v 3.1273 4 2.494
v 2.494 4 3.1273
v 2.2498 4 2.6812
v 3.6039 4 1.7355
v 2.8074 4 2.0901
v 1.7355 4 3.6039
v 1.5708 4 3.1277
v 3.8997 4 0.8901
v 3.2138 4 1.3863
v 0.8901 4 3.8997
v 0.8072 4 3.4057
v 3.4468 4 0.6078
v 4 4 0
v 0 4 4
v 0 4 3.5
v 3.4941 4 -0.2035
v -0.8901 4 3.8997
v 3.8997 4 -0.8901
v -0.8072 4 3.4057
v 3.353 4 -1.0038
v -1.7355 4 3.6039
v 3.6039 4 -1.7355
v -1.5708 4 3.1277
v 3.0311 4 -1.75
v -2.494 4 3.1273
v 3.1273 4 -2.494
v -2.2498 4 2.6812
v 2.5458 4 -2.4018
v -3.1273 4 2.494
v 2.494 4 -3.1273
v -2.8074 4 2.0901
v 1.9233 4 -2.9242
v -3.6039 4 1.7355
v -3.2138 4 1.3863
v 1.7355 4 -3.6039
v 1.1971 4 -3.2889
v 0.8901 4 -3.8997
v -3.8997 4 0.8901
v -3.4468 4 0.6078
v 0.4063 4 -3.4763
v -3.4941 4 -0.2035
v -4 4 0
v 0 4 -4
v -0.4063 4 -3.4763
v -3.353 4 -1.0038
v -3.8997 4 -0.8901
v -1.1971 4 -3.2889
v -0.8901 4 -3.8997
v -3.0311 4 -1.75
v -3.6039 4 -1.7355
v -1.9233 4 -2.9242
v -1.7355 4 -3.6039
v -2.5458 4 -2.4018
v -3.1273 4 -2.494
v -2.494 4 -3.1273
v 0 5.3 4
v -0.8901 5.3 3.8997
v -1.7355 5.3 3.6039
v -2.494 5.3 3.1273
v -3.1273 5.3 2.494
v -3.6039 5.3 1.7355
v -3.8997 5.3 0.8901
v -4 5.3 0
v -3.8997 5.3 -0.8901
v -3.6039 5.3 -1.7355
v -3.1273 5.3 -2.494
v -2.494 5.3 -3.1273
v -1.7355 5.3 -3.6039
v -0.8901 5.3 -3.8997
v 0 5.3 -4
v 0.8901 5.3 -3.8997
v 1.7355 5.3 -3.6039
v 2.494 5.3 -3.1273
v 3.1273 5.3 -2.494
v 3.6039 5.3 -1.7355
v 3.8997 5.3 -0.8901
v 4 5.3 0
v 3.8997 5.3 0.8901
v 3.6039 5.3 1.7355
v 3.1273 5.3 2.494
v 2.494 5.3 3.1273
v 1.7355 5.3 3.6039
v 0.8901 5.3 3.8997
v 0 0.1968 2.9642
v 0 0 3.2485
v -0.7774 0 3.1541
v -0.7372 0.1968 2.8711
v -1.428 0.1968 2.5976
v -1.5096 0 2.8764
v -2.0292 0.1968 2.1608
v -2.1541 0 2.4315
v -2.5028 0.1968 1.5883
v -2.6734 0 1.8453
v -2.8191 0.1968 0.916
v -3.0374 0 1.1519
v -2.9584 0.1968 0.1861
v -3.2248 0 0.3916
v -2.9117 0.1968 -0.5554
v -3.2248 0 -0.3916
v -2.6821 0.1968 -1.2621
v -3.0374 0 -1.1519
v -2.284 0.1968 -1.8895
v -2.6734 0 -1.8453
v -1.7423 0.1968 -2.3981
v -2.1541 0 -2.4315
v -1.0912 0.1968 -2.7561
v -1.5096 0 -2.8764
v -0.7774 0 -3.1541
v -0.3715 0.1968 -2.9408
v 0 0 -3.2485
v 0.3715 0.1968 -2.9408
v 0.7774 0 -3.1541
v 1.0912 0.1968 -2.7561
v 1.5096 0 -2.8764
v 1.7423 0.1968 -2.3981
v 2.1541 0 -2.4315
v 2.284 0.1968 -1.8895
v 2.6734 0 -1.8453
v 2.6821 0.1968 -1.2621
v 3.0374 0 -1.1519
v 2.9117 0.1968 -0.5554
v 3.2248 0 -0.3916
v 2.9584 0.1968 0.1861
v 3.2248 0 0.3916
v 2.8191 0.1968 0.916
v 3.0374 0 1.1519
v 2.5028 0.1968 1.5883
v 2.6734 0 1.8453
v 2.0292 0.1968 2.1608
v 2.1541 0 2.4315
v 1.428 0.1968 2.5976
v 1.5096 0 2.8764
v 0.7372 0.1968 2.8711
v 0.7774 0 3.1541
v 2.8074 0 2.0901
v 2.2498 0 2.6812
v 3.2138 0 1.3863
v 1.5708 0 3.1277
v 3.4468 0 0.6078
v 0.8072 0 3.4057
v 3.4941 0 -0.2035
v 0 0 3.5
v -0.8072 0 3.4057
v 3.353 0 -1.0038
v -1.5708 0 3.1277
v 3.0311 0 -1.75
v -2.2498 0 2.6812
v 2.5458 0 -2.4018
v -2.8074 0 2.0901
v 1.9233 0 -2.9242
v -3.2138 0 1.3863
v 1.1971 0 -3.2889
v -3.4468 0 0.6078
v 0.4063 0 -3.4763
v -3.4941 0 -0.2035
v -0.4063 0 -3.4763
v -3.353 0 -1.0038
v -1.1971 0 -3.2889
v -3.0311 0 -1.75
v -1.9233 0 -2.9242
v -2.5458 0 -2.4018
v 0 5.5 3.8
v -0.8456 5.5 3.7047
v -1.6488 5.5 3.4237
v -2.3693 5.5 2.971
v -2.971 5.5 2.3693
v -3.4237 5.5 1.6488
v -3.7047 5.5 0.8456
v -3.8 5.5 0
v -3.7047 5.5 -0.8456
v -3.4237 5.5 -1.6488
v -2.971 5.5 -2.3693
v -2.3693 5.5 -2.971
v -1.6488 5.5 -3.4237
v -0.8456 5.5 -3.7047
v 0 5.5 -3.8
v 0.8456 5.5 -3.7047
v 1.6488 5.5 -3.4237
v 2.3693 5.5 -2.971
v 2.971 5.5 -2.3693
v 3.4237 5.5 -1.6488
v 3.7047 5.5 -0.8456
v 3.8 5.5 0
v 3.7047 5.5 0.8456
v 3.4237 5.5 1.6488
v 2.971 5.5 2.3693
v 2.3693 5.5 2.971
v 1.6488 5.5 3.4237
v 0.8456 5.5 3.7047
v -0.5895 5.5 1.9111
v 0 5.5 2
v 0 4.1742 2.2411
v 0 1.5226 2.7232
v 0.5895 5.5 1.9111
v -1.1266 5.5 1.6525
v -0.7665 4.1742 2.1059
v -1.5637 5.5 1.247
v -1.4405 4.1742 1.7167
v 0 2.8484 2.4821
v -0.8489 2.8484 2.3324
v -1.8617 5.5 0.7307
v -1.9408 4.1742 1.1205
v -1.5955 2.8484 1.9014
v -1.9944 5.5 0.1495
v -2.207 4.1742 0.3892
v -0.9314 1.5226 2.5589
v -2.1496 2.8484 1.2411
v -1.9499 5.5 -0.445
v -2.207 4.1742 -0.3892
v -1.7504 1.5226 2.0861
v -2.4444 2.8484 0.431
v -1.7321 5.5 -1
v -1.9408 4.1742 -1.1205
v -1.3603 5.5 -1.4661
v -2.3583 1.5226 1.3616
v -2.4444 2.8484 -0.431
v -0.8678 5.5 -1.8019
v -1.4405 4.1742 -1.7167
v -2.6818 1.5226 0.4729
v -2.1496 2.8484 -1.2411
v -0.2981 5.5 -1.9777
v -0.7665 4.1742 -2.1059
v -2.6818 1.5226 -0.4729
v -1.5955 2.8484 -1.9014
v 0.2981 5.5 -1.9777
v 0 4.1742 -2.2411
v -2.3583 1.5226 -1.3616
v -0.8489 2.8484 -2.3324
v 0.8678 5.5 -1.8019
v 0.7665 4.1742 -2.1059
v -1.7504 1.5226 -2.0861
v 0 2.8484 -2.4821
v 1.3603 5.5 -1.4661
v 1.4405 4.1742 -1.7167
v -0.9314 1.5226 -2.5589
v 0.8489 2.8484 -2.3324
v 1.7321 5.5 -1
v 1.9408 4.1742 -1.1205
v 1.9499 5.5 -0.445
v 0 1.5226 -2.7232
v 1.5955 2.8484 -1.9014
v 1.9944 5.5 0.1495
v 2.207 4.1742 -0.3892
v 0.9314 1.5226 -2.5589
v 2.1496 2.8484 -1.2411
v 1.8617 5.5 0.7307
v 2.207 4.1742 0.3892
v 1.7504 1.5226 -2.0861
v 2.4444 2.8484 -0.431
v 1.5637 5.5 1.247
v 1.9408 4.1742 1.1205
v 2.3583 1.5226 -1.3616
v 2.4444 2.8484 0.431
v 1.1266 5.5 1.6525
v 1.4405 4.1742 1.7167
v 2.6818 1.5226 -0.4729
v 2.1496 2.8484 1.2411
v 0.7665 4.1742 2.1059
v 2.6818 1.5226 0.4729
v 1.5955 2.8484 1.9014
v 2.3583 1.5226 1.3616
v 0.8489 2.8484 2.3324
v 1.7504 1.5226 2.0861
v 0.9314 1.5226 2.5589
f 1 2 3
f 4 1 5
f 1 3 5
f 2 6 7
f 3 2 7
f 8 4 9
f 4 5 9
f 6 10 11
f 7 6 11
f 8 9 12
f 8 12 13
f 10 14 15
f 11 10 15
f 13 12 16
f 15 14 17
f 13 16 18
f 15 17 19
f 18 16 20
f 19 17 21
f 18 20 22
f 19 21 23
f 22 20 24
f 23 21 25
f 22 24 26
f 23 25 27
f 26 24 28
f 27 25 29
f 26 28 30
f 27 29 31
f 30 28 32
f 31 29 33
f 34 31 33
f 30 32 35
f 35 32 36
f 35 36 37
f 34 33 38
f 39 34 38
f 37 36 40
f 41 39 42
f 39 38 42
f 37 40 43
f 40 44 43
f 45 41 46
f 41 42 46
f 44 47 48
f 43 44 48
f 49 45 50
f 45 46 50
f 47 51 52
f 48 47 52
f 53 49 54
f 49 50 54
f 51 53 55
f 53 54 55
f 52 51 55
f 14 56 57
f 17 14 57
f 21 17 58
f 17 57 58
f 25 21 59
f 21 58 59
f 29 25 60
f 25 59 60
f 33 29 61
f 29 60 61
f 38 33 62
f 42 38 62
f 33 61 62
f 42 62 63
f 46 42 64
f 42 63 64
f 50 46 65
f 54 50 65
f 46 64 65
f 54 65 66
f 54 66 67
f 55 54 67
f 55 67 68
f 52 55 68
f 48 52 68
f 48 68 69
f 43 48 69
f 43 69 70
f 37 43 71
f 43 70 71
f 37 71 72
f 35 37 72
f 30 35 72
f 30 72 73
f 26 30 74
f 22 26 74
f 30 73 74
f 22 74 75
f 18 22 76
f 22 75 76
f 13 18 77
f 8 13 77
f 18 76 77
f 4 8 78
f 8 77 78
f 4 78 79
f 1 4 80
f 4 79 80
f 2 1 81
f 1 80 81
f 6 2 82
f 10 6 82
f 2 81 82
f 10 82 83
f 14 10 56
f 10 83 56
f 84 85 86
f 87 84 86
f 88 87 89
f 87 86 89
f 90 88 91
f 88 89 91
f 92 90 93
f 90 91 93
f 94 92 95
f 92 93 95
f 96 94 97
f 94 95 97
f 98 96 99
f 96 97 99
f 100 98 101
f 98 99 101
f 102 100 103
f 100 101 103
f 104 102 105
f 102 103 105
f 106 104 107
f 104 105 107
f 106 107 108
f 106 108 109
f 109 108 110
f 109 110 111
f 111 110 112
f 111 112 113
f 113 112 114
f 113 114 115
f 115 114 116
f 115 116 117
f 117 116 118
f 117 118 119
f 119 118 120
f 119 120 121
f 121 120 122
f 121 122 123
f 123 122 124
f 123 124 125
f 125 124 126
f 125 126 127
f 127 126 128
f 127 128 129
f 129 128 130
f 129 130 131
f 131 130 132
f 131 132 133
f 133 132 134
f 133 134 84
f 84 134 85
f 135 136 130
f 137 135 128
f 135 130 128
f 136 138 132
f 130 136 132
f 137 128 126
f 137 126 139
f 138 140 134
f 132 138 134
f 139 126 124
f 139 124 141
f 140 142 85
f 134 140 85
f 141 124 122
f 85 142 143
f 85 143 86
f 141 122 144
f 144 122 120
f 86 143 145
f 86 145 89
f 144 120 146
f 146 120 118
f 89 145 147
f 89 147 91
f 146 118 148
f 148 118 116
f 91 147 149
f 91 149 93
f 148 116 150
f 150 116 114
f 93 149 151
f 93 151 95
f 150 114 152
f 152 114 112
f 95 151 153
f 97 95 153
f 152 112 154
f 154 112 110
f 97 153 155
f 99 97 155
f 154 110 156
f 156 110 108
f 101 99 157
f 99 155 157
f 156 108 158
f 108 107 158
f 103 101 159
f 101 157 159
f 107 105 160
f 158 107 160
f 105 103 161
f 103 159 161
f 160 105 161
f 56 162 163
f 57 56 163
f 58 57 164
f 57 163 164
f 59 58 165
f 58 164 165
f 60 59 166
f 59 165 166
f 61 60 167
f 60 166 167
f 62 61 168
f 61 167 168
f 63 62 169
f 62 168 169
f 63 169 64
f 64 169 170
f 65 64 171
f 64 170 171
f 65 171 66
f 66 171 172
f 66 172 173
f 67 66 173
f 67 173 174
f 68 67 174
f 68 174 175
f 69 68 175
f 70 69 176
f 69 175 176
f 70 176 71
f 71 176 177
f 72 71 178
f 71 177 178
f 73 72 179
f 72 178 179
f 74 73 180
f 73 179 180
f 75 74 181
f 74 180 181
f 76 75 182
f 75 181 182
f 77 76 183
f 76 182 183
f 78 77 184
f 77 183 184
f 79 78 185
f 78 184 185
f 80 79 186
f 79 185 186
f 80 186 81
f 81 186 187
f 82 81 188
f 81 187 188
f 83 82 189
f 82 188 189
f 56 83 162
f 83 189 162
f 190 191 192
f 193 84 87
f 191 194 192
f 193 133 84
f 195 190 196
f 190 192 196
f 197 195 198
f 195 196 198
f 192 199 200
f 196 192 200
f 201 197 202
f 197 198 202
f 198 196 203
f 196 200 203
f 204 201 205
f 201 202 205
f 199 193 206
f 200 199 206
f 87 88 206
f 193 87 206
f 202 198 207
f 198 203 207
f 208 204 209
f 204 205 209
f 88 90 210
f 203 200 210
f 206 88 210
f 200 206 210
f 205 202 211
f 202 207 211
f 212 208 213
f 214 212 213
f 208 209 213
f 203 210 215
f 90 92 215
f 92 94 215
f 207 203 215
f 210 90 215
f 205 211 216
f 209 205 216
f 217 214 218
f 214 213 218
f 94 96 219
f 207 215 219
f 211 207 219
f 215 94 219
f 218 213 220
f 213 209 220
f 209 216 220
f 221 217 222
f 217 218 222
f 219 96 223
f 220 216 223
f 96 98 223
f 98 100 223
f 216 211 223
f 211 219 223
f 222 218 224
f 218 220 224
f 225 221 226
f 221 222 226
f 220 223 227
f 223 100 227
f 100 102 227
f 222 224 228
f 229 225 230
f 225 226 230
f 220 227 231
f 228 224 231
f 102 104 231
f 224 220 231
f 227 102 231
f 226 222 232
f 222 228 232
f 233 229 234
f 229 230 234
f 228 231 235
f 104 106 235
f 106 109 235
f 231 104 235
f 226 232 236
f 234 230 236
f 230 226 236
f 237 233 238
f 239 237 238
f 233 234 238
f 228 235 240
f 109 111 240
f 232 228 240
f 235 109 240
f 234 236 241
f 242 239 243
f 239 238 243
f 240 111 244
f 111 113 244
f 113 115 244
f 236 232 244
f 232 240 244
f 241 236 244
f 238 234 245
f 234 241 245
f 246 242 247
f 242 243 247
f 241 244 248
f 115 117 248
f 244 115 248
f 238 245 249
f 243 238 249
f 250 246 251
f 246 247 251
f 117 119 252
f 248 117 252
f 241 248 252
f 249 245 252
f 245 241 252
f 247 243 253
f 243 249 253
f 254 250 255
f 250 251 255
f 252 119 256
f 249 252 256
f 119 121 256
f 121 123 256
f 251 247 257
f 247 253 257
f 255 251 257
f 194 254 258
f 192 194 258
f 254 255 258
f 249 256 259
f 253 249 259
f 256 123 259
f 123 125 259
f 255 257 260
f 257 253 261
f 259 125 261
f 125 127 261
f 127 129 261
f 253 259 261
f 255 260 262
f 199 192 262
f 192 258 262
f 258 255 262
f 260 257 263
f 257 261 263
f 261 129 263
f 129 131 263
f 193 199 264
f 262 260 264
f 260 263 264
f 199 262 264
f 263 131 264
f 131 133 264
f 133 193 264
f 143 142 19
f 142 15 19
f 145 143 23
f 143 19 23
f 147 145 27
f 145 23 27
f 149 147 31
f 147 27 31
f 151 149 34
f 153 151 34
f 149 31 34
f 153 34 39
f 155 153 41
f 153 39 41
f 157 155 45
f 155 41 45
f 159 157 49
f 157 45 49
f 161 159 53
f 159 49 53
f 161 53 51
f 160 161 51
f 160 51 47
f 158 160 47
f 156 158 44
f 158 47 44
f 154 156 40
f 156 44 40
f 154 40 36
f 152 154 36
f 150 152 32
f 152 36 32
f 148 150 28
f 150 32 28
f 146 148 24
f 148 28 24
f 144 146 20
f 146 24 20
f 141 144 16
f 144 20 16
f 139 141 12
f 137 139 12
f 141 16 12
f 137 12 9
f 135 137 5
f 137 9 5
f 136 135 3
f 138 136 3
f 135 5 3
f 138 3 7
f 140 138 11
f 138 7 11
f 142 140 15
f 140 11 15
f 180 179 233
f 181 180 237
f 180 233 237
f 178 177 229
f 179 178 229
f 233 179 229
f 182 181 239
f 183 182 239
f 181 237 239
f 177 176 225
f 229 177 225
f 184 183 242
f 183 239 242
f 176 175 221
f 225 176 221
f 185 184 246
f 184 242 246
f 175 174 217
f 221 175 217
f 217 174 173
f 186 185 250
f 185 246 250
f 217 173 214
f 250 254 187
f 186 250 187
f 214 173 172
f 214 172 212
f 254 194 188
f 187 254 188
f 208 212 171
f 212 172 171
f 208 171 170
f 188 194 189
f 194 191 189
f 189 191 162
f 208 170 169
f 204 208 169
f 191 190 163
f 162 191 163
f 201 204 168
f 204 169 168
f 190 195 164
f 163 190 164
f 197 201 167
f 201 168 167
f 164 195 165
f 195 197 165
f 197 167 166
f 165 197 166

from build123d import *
from OCP.BRepFilletAPI import BRepFilletAPI_MakeChamfer

# Parameters (mm, degrees)
CHAMFER1_SIZE  = 0.2
CHAMFER1_SIZE2 = 0.248451997


with BuildPart() as part:
    # Sketch1 → Revolve1 (revolve)
    with BuildSketch(Plane.XY, mode=Mode.PRIVATE) as revolve1_sk:
        Polygon((-3, 0), (-3.5, 0), (-3.5, 4), (-4, 4), (-4, 5.5), (-2, 5.5), align=None)
    revolve(revolve1_sk.sketch.rotate(Axis((0, 5.5, 0), (0, -1, 0)), 270), axis=Axis((0, 5.5, 0), (0, -1, 0)))

    # Chamfer1: one chamfer whose edges measure the first distance from different faces: ONE call of the kernel's chamfer builder (chamfer() names one face for all edges)
    chamfer1_edges_1 = [part.edges().sort_by_distance(p)[0] for p in [
        (0, 5.5, -4),
    ]]
    chamfer1_edges_2 = [part.edges().sort_by_distance(p)[0] for p in [
        (0, 0, -3),
    ]]
    chamfer1_side_2 = [part.faces().sort_by_distance(p)[0] for p in [
        (0, 2.75, -2.5),
    ]]
    chamfer1 = BRepFilletAPI_MakeChamfer(part.part.solid().wrapped)
    for e in chamfer1_edges_1:
        chamfer1.Add(CHAMFER1_SIZE, e.wrapped)
    for e in chamfer1_edges_2:
        chamfer1.Add(CHAMFER1_SIZE, CHAMFER1_SIZE2, e.wrapped, chamfer1_side_2[0].wrapped)  # the first distance lies on this face
    add(Compound.cast(chamfer1.Shape()), mode=Mode.REPLACE)


solid = part.part
